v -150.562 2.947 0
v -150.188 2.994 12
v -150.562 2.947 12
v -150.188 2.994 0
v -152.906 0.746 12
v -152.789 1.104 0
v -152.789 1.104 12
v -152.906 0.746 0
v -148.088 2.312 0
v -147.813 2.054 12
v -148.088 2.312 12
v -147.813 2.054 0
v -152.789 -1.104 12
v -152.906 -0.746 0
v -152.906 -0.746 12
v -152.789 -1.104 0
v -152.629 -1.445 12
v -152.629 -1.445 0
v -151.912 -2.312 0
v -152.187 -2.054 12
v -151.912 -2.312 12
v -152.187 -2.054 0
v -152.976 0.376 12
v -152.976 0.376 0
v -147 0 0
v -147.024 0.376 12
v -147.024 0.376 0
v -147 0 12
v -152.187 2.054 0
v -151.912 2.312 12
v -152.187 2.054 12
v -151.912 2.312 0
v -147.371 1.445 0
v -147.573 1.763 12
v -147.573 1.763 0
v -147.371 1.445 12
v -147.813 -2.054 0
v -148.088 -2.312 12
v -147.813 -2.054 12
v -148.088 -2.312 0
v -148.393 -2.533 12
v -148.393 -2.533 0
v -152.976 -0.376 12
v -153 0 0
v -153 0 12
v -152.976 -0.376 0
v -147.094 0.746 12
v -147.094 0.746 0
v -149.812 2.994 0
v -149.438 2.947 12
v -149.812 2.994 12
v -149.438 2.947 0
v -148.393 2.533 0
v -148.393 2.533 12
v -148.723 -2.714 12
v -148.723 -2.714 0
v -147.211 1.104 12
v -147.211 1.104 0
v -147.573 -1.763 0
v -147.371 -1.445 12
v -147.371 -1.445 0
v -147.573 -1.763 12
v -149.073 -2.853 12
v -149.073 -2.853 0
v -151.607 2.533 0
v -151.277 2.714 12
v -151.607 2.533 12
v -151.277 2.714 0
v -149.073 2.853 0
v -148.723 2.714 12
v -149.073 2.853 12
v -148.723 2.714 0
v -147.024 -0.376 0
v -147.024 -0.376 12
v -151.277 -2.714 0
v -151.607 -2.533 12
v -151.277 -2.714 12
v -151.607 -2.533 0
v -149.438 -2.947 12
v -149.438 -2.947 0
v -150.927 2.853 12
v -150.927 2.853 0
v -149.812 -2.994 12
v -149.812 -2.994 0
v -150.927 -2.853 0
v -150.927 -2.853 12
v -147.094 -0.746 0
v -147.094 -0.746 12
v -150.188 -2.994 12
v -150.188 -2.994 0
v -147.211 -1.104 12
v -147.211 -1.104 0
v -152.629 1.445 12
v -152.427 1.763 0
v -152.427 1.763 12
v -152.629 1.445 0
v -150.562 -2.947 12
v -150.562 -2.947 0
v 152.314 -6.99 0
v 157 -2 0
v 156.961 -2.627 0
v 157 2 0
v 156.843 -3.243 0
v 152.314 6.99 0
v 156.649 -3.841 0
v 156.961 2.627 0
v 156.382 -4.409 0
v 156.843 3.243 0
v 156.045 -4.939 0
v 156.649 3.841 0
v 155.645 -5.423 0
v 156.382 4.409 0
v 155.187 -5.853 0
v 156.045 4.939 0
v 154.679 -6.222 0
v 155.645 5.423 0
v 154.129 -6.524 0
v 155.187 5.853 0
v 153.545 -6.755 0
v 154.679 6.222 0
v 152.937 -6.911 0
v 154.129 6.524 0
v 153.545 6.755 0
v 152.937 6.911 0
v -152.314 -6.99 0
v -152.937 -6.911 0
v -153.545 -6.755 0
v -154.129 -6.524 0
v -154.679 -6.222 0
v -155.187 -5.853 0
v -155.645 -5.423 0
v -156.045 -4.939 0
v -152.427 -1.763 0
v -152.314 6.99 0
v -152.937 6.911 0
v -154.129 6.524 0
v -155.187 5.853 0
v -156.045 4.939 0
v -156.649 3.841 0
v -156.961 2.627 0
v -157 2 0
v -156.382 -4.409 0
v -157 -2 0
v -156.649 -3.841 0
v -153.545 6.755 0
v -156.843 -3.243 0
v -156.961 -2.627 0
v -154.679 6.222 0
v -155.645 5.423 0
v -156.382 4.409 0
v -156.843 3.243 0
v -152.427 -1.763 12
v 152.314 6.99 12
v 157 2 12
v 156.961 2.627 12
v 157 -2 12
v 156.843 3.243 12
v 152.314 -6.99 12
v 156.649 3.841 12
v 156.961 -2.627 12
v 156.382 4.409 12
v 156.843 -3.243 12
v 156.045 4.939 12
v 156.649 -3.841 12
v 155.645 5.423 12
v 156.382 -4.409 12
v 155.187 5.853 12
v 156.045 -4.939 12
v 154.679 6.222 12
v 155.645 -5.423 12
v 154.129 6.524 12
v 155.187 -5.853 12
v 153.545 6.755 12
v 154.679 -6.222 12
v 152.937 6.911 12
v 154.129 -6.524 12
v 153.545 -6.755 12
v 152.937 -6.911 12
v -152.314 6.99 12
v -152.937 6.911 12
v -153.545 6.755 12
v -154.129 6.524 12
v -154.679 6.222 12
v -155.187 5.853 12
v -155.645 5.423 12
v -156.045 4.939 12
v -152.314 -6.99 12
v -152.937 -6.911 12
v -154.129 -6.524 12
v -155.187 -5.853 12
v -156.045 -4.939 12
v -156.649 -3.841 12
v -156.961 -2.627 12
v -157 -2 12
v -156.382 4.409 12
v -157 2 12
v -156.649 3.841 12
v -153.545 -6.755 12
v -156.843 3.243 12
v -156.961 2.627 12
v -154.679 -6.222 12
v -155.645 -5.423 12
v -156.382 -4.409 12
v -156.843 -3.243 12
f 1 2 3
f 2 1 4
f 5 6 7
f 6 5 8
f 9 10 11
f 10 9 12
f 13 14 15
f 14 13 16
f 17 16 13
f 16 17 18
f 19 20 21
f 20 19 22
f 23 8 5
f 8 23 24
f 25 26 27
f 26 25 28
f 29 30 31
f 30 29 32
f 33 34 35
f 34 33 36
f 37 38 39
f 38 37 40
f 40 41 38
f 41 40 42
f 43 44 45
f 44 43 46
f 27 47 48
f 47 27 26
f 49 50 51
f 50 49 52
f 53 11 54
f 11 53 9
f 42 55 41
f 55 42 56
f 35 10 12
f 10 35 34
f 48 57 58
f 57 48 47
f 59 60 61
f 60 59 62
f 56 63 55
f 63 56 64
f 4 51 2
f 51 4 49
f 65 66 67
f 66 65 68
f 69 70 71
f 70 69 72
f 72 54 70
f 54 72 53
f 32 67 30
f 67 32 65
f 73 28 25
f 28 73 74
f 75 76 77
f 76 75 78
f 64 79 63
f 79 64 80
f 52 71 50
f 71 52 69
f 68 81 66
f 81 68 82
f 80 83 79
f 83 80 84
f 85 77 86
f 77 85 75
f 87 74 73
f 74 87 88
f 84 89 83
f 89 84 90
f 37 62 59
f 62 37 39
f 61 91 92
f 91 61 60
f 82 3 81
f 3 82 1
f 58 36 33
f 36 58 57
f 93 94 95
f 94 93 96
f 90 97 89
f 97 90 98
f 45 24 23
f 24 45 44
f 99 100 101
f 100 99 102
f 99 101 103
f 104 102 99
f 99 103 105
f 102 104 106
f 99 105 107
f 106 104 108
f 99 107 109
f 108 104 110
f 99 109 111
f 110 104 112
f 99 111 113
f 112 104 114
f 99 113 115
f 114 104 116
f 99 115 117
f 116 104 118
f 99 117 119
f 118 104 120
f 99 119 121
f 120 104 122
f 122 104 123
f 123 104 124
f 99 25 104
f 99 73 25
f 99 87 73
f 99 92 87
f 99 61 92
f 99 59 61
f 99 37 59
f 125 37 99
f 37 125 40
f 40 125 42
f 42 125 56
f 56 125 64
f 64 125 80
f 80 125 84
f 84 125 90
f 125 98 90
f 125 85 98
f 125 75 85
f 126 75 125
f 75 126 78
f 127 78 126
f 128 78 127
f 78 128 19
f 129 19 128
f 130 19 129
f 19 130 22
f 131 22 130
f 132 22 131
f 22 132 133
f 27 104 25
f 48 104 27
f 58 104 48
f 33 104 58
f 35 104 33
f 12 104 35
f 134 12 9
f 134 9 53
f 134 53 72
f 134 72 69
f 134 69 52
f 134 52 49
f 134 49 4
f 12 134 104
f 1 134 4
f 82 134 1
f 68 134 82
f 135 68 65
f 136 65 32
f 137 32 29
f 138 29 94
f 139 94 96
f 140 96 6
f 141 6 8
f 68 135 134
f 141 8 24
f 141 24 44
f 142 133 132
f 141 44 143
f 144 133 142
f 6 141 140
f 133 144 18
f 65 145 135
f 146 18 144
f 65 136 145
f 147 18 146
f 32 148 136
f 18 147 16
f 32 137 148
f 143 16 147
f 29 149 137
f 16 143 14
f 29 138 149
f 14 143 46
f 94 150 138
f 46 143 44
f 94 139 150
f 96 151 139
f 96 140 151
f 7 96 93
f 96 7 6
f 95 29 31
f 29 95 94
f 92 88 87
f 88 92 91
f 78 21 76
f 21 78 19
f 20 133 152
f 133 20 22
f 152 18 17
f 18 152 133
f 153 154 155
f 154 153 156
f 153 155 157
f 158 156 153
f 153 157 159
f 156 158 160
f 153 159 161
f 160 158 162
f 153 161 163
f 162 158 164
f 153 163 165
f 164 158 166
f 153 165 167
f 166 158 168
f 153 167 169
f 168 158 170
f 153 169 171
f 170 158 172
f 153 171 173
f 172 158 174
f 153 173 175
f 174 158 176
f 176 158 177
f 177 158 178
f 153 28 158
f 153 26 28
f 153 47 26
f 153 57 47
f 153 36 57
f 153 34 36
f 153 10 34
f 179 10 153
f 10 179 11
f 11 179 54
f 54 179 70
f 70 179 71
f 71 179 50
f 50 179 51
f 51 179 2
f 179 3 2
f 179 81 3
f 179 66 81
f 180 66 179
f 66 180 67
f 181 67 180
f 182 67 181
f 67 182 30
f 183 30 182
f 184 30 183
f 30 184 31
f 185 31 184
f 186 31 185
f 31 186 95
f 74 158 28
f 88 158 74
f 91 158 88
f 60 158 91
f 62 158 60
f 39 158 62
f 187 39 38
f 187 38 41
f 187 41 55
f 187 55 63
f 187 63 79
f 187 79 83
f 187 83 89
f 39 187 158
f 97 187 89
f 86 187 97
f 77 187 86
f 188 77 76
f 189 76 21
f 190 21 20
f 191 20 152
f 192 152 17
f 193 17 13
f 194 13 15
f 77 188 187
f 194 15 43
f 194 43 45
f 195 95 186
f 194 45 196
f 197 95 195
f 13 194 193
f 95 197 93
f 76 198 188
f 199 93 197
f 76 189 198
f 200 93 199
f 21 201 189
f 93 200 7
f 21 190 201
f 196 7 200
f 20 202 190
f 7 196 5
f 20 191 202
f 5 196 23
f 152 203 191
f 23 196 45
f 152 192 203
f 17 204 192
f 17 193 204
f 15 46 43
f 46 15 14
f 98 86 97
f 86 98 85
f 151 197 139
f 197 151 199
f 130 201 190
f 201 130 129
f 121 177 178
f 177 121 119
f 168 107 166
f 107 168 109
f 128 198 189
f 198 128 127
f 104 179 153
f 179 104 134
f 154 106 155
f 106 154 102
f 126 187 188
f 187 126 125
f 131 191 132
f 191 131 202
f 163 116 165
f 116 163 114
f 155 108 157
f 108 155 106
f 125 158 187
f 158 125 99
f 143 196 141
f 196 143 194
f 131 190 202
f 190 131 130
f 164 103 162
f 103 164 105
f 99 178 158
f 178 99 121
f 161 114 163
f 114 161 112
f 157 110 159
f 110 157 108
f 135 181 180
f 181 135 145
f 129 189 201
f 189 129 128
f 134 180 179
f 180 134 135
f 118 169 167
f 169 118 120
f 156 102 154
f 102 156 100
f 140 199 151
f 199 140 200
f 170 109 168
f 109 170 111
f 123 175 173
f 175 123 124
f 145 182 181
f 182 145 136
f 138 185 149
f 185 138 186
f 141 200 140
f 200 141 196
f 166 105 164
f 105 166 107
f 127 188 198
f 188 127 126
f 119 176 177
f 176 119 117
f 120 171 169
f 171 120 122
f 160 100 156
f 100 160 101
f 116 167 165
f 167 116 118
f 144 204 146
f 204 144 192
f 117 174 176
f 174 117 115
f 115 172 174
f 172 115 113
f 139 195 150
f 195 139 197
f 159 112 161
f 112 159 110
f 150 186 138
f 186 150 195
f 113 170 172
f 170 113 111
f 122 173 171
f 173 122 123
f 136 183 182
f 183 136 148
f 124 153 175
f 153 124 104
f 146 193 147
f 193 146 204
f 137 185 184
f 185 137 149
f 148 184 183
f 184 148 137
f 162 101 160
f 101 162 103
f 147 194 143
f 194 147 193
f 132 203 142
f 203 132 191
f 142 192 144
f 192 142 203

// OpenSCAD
$fn = 50;


difference() {
	union() {
		hull() {
			translate(v = [-152.0000000000, 2.0000000000, 0]) {
				cylinder(h = 12, r = 5);
			}
			translate(v = [152.0000000000, 2.0000000000, 0]) {
				cylinder(h = 12, r = 5);
			}
			translate(v = [-152.0000000000, -2.0000000000, 0]) {
				cylinder(h = 12, r = 5);
			}
			translate(v = [152.0000000000, -2.0000000000, 0]) {
				cylinder(h = 12, r = 5);
			}
		}
	}
	union() {
		translate(v = [-150.0000000000, 0.0000000000, 0]) {
			cylinder(h = 12, r = 3.0000000000);
		}
		translate(v = [-150.0000000000, 0.0000000000, 0]) {
			cylinder(h = 12, r = 1.5000000000);
		}
		translate(v = [-150.0000000000, 0.0000000000, 0]) {
			cylinder(h = 12, r = 1.5000000000);
		}
		translate(v = [-150.0000000000, 0.0000000000, 0]) {
			cylinder(h = 12, r = 1.5000000000);
		}
	}
}
